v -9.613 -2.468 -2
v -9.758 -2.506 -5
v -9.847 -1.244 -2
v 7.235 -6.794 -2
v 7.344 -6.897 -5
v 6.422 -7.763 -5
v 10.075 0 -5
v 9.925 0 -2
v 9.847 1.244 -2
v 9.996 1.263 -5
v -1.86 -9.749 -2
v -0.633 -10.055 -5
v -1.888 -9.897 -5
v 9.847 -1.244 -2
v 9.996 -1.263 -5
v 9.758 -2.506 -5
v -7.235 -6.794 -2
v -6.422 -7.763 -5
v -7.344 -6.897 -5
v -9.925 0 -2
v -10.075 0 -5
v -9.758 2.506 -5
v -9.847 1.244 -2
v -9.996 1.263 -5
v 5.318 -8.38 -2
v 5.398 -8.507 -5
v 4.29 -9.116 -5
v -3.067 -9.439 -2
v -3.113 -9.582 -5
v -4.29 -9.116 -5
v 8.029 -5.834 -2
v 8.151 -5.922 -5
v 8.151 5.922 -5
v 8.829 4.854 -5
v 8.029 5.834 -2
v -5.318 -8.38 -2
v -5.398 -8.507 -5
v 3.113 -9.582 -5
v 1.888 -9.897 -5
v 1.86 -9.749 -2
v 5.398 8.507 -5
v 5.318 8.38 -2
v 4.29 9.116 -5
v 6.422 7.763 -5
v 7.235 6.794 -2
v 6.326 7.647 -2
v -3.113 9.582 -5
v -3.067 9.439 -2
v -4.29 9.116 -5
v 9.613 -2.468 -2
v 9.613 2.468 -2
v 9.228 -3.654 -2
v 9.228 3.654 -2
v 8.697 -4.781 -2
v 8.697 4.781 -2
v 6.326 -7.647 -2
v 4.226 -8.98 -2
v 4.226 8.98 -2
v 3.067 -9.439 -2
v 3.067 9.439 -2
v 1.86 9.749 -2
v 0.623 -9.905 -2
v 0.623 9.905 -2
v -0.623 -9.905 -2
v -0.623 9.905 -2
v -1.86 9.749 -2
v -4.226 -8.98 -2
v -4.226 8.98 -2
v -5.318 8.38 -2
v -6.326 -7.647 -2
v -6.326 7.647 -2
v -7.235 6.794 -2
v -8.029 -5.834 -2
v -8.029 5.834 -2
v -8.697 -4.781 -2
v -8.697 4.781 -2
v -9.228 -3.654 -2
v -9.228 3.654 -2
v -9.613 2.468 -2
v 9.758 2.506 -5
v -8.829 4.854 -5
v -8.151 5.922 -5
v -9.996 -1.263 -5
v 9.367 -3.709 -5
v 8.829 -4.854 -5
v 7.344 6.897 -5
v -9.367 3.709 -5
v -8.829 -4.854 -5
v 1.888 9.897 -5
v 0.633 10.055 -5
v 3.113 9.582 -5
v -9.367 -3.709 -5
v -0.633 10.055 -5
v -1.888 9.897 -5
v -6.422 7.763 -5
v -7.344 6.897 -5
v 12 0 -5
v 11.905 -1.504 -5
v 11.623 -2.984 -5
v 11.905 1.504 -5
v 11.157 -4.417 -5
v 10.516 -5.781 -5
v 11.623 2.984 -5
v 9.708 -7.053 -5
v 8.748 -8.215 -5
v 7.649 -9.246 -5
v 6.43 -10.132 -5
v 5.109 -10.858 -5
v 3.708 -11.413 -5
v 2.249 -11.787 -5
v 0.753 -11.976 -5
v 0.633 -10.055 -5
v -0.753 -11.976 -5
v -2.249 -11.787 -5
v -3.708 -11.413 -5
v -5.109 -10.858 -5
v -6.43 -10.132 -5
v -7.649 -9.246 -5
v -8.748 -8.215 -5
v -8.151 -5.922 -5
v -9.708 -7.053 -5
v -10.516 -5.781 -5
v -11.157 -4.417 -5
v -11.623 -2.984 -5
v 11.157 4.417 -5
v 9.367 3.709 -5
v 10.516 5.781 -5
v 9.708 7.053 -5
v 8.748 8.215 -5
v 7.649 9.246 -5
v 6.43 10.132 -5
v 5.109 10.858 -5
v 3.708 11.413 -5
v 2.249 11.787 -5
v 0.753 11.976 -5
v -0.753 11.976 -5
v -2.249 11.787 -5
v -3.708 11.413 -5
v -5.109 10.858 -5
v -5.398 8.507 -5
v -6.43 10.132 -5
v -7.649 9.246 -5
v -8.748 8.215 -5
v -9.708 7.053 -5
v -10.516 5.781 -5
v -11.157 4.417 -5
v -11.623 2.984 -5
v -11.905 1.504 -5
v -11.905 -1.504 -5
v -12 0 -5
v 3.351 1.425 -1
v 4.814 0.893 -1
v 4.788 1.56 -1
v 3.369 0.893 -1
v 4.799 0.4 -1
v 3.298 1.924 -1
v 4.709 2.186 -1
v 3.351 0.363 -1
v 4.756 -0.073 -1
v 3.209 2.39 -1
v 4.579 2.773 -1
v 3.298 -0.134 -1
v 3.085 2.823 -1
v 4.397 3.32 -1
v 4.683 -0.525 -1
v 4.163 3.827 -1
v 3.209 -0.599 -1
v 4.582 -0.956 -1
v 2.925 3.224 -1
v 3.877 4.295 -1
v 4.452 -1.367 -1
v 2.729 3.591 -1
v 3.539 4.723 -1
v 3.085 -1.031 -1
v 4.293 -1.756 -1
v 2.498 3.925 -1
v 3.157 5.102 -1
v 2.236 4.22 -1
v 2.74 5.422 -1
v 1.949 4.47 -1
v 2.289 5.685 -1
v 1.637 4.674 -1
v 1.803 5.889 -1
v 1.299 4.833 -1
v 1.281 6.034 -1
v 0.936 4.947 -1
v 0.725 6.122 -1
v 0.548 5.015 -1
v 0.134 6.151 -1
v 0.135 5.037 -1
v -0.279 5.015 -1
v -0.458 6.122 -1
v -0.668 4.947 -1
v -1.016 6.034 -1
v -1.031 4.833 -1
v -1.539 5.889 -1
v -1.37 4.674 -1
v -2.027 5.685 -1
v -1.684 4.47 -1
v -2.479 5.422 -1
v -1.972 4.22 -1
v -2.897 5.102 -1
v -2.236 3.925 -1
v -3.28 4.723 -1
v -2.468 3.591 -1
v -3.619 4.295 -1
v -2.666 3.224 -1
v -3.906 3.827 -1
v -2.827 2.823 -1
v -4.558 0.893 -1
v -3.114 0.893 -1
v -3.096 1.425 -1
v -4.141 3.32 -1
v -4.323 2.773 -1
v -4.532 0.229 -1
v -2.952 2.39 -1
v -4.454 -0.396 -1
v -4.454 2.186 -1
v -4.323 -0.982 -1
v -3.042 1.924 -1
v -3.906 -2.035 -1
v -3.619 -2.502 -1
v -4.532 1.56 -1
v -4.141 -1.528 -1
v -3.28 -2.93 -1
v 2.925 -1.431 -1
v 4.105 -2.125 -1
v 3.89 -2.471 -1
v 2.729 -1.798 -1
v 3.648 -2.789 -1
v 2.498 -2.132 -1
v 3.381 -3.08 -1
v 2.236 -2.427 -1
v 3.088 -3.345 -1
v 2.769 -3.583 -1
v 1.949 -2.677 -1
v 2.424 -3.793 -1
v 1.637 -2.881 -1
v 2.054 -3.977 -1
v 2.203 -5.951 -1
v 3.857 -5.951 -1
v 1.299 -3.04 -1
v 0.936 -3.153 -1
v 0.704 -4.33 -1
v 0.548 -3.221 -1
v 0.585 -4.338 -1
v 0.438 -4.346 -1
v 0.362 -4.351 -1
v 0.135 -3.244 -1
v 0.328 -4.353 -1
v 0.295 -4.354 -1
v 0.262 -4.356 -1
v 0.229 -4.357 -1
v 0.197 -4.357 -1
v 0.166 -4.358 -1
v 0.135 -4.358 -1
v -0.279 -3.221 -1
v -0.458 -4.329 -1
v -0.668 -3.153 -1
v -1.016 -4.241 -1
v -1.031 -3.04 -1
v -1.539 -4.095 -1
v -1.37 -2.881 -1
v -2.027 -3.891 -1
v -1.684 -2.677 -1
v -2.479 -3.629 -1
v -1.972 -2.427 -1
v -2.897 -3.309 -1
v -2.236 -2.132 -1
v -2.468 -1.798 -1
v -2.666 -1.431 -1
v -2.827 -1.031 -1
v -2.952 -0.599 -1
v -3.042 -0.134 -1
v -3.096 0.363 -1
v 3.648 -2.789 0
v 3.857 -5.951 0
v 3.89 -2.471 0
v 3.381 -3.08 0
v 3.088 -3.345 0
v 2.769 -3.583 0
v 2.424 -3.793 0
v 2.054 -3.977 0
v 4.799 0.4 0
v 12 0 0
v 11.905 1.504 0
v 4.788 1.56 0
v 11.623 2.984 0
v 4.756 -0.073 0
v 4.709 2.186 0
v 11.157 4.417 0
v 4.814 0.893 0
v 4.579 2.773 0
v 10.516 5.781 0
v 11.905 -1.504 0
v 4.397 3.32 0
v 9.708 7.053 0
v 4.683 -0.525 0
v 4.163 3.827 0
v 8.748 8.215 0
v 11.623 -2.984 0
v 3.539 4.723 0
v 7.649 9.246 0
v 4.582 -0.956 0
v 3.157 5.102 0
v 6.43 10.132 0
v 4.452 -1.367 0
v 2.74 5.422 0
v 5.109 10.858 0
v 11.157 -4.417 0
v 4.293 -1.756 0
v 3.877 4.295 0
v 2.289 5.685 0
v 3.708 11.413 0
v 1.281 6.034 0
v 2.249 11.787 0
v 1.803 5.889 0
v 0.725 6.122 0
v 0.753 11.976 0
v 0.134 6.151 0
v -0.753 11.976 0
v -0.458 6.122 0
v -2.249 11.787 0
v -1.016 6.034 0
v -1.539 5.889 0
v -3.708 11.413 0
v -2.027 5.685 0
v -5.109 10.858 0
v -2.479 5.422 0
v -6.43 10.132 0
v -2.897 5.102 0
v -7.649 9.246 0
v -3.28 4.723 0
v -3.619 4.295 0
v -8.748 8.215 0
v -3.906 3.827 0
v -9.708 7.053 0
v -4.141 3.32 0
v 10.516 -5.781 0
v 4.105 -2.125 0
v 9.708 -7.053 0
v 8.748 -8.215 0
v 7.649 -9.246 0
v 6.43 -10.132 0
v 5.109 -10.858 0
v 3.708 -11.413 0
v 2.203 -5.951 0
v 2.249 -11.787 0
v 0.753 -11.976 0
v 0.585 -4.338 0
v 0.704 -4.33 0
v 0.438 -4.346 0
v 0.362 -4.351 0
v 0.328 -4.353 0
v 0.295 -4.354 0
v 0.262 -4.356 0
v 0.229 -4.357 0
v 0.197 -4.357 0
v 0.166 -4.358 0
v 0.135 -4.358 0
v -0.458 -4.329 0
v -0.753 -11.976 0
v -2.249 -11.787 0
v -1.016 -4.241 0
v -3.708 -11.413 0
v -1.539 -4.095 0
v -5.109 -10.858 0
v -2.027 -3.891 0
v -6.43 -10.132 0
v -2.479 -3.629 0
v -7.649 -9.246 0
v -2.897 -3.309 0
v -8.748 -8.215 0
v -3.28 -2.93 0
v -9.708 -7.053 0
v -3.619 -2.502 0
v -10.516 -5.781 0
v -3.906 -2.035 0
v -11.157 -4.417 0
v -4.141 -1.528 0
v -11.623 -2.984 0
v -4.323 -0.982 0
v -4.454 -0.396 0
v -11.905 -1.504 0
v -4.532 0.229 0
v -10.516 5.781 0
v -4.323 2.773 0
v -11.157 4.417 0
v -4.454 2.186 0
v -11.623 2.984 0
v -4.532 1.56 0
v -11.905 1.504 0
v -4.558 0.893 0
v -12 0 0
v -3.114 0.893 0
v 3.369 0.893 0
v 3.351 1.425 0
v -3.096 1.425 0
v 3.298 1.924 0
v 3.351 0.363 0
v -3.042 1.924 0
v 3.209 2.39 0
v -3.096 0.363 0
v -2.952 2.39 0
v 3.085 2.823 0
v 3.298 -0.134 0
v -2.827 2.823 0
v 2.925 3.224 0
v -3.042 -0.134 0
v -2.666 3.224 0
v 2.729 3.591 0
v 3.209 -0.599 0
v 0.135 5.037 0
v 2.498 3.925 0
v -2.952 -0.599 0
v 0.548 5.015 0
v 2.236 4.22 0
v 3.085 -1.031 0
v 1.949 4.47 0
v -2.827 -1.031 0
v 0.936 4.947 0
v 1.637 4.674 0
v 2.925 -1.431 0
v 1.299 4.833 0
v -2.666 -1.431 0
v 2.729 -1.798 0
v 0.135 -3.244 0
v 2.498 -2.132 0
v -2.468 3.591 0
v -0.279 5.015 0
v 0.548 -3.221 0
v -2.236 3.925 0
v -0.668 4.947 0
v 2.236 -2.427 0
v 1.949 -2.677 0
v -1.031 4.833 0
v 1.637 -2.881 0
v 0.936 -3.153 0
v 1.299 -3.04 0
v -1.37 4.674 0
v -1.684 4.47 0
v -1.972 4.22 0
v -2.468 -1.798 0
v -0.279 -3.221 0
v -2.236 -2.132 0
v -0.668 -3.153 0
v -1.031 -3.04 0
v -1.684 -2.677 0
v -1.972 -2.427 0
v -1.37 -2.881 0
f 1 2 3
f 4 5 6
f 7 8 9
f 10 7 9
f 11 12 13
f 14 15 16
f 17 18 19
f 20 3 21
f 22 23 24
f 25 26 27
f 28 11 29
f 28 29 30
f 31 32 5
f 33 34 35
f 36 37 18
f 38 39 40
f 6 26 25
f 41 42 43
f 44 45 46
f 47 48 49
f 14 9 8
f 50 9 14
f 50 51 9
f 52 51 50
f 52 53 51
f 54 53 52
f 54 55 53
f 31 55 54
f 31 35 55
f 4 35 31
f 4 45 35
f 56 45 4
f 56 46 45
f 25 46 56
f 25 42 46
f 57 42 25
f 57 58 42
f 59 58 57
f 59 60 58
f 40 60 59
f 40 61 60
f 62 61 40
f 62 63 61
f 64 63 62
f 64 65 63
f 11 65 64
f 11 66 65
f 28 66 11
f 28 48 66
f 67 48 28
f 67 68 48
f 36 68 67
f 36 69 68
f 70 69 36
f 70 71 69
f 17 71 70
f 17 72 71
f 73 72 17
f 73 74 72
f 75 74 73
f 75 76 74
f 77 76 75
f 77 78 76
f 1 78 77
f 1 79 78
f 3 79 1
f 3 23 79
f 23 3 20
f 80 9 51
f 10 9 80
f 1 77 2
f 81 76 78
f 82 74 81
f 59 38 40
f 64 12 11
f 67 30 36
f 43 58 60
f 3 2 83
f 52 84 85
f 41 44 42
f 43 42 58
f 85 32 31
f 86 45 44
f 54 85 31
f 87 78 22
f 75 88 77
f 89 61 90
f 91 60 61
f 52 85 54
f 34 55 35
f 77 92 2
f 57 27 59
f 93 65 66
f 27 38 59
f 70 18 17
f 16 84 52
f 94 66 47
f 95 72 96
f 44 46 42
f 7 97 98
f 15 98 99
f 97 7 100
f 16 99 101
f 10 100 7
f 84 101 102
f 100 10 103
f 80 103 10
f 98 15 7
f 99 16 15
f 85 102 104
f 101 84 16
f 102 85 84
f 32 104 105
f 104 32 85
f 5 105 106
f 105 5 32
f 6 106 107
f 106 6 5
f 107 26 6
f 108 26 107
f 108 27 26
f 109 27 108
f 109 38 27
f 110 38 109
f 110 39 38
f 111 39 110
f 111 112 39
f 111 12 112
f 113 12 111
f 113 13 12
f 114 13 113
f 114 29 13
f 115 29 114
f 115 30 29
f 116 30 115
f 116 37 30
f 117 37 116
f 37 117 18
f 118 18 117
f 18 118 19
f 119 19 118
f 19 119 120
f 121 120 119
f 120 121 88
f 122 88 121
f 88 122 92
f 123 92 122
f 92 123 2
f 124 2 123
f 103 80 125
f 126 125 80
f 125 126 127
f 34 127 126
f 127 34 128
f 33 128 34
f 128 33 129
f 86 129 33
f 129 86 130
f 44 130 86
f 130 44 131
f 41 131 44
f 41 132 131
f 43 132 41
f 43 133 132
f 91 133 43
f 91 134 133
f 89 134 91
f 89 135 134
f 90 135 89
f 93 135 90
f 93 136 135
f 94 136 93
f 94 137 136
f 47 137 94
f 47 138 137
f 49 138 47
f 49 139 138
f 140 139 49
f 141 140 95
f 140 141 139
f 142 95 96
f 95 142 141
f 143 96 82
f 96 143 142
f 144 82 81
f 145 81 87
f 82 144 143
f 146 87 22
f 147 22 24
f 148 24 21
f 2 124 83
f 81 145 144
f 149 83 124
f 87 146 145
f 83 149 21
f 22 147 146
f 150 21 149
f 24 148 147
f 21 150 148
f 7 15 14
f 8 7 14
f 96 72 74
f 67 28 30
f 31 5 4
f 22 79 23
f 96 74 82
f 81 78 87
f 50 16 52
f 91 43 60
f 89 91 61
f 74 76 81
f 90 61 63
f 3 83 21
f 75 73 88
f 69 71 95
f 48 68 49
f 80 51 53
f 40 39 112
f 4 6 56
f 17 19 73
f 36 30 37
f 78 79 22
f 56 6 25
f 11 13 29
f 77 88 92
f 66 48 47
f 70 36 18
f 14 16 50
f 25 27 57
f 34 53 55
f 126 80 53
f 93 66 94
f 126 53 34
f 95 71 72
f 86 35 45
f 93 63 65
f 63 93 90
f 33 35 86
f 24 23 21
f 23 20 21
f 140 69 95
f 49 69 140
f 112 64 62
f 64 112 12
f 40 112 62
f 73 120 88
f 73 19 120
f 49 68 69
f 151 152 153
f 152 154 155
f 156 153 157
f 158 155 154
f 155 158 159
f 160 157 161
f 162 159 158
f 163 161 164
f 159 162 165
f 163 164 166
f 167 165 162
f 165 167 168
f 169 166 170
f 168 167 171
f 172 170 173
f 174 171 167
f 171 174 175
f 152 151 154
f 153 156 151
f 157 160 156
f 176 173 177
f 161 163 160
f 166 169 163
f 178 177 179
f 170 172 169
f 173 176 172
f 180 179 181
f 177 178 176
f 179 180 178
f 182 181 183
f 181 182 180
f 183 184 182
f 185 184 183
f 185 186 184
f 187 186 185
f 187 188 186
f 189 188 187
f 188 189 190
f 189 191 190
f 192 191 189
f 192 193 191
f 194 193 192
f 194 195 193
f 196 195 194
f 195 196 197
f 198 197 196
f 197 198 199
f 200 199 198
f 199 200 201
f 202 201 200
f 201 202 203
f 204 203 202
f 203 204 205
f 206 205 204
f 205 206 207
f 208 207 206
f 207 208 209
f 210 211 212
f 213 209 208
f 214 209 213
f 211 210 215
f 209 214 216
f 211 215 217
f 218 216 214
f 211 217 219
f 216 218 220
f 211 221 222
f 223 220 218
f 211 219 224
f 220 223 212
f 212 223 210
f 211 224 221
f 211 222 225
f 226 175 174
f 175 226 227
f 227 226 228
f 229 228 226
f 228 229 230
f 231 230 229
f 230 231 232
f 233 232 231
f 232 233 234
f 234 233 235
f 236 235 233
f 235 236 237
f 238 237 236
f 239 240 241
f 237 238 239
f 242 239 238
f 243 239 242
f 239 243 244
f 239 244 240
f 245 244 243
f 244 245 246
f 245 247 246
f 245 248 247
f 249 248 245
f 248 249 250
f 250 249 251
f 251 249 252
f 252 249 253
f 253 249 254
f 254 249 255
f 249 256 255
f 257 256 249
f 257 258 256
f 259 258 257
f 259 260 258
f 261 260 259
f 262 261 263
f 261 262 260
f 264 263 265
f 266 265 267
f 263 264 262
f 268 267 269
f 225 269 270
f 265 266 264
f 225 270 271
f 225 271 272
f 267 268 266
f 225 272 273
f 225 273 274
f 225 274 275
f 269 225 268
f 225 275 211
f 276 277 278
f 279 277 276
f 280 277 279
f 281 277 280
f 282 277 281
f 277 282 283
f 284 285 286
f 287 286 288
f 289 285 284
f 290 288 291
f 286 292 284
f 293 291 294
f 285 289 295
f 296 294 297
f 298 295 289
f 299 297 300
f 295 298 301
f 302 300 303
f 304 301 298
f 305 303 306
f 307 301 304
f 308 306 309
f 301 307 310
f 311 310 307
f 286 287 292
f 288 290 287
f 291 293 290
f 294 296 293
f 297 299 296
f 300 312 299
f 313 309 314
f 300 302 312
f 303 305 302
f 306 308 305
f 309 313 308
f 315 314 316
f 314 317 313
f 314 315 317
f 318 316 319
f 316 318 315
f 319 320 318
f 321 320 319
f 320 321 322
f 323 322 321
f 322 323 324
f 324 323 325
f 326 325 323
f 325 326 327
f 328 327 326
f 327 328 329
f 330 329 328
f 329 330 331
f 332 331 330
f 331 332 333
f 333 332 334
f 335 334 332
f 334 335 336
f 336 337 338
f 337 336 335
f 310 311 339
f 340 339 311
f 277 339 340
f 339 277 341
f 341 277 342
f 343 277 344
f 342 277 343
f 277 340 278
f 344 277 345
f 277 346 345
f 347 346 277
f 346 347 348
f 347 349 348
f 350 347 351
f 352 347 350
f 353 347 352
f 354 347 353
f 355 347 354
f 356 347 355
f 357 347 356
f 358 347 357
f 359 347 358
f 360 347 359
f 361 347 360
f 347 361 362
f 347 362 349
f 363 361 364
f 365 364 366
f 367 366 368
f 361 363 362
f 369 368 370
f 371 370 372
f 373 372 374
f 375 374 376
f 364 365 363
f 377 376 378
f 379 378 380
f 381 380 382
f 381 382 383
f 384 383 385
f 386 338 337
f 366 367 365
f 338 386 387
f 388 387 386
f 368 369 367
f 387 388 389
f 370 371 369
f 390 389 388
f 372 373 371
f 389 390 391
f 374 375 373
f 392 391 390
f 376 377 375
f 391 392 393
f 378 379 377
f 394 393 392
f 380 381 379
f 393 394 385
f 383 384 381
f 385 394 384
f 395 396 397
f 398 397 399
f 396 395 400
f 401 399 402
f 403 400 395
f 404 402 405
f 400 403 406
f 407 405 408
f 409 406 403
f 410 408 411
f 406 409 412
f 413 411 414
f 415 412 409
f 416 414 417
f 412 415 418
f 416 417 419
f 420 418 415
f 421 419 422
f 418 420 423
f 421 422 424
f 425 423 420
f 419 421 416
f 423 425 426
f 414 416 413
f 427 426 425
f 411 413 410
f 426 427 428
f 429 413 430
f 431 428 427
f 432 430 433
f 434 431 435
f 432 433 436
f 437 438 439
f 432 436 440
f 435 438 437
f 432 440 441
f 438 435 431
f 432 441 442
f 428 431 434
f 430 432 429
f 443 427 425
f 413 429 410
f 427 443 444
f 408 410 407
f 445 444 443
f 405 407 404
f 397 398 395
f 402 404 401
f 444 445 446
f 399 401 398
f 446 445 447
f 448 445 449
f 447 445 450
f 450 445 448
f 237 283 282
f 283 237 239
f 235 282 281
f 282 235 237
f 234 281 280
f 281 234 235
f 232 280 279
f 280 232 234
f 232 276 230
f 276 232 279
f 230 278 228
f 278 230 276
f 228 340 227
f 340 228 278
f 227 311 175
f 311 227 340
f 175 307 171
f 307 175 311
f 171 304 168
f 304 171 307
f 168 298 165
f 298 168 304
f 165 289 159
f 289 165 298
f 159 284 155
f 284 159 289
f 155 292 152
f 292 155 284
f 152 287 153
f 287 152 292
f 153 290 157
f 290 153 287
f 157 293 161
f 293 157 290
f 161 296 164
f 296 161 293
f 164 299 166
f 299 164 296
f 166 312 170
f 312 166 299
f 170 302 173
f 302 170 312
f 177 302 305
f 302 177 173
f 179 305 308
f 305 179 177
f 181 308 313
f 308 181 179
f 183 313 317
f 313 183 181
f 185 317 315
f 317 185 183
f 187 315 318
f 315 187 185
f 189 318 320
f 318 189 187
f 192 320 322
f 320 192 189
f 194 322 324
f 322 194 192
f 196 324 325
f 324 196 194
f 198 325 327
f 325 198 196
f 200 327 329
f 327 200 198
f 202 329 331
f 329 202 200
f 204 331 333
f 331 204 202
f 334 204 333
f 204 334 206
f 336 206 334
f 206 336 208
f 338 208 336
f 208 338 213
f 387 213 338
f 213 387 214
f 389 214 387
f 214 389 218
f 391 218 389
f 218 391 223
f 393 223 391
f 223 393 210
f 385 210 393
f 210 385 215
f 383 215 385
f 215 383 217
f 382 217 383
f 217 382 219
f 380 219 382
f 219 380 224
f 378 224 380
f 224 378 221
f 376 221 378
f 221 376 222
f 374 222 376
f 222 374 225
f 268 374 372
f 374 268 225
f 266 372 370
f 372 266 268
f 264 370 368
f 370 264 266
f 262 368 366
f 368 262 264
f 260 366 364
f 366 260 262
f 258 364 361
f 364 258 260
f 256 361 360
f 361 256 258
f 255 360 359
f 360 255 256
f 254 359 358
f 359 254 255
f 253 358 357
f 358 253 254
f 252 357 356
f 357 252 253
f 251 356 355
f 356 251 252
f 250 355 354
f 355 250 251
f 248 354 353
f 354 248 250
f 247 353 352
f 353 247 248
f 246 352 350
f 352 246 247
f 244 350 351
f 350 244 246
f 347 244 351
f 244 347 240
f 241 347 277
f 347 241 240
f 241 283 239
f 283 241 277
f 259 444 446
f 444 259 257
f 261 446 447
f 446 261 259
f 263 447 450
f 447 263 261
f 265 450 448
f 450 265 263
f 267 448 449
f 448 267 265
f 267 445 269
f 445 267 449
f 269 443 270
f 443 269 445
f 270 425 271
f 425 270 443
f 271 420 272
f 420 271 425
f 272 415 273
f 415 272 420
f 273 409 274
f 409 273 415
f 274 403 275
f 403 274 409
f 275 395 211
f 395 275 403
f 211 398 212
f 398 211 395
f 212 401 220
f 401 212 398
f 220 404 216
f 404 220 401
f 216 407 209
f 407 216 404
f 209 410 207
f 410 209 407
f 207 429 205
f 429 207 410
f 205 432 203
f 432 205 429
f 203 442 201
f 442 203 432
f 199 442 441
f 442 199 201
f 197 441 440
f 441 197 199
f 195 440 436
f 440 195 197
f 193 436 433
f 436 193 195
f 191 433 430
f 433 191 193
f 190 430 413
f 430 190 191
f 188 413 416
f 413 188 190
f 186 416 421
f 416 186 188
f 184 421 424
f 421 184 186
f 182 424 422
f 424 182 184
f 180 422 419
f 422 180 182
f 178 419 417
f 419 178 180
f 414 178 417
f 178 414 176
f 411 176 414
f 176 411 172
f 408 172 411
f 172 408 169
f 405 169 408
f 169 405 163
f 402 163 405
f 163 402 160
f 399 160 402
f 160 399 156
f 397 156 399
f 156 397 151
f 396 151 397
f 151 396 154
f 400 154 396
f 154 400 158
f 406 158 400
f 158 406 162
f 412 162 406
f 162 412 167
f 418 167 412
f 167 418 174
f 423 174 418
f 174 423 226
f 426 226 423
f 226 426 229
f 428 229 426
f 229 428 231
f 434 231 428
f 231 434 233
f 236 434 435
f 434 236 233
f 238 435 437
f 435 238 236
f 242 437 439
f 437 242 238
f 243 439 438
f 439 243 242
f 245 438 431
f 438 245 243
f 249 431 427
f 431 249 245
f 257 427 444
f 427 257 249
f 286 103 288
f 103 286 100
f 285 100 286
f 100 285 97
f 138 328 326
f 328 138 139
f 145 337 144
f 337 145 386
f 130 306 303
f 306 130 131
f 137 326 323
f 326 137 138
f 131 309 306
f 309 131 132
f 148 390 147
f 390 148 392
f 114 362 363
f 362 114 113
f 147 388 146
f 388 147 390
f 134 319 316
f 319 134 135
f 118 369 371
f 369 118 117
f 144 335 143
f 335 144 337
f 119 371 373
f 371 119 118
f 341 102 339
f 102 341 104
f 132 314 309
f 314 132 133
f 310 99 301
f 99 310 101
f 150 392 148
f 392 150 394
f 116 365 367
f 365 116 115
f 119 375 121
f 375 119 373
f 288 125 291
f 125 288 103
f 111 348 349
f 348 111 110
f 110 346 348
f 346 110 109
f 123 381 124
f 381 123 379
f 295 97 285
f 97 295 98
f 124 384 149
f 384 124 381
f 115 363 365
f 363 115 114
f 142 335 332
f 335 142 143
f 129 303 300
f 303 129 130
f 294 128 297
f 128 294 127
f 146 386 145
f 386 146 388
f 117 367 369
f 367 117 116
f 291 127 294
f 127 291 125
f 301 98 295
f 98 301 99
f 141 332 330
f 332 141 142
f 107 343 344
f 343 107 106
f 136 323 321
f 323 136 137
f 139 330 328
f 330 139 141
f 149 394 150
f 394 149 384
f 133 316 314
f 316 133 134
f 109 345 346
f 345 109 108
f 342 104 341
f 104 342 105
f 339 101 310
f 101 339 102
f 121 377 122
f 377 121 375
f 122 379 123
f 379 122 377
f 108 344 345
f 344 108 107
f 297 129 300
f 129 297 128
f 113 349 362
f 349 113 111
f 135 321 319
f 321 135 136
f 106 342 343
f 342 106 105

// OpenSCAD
$fn = 50;

difference() {
	union() {
		translate(v = [0, 0, -5.0]) {
			cylinder(h = 5, r = 12.0);
		}
	}
	union() {
		#translate(v = [0, 0, -5.0]) {
			cylinder(h = 3, r1 = 10.075, r2 = 9.925);
		}
		translate(v = [0, 0, -1]) {
			linear_extrude(height = 1) {
				text(font = "Impact", halign = "center", size = 10, text = "Q", valign = "center");
			}
		}
	}
}
